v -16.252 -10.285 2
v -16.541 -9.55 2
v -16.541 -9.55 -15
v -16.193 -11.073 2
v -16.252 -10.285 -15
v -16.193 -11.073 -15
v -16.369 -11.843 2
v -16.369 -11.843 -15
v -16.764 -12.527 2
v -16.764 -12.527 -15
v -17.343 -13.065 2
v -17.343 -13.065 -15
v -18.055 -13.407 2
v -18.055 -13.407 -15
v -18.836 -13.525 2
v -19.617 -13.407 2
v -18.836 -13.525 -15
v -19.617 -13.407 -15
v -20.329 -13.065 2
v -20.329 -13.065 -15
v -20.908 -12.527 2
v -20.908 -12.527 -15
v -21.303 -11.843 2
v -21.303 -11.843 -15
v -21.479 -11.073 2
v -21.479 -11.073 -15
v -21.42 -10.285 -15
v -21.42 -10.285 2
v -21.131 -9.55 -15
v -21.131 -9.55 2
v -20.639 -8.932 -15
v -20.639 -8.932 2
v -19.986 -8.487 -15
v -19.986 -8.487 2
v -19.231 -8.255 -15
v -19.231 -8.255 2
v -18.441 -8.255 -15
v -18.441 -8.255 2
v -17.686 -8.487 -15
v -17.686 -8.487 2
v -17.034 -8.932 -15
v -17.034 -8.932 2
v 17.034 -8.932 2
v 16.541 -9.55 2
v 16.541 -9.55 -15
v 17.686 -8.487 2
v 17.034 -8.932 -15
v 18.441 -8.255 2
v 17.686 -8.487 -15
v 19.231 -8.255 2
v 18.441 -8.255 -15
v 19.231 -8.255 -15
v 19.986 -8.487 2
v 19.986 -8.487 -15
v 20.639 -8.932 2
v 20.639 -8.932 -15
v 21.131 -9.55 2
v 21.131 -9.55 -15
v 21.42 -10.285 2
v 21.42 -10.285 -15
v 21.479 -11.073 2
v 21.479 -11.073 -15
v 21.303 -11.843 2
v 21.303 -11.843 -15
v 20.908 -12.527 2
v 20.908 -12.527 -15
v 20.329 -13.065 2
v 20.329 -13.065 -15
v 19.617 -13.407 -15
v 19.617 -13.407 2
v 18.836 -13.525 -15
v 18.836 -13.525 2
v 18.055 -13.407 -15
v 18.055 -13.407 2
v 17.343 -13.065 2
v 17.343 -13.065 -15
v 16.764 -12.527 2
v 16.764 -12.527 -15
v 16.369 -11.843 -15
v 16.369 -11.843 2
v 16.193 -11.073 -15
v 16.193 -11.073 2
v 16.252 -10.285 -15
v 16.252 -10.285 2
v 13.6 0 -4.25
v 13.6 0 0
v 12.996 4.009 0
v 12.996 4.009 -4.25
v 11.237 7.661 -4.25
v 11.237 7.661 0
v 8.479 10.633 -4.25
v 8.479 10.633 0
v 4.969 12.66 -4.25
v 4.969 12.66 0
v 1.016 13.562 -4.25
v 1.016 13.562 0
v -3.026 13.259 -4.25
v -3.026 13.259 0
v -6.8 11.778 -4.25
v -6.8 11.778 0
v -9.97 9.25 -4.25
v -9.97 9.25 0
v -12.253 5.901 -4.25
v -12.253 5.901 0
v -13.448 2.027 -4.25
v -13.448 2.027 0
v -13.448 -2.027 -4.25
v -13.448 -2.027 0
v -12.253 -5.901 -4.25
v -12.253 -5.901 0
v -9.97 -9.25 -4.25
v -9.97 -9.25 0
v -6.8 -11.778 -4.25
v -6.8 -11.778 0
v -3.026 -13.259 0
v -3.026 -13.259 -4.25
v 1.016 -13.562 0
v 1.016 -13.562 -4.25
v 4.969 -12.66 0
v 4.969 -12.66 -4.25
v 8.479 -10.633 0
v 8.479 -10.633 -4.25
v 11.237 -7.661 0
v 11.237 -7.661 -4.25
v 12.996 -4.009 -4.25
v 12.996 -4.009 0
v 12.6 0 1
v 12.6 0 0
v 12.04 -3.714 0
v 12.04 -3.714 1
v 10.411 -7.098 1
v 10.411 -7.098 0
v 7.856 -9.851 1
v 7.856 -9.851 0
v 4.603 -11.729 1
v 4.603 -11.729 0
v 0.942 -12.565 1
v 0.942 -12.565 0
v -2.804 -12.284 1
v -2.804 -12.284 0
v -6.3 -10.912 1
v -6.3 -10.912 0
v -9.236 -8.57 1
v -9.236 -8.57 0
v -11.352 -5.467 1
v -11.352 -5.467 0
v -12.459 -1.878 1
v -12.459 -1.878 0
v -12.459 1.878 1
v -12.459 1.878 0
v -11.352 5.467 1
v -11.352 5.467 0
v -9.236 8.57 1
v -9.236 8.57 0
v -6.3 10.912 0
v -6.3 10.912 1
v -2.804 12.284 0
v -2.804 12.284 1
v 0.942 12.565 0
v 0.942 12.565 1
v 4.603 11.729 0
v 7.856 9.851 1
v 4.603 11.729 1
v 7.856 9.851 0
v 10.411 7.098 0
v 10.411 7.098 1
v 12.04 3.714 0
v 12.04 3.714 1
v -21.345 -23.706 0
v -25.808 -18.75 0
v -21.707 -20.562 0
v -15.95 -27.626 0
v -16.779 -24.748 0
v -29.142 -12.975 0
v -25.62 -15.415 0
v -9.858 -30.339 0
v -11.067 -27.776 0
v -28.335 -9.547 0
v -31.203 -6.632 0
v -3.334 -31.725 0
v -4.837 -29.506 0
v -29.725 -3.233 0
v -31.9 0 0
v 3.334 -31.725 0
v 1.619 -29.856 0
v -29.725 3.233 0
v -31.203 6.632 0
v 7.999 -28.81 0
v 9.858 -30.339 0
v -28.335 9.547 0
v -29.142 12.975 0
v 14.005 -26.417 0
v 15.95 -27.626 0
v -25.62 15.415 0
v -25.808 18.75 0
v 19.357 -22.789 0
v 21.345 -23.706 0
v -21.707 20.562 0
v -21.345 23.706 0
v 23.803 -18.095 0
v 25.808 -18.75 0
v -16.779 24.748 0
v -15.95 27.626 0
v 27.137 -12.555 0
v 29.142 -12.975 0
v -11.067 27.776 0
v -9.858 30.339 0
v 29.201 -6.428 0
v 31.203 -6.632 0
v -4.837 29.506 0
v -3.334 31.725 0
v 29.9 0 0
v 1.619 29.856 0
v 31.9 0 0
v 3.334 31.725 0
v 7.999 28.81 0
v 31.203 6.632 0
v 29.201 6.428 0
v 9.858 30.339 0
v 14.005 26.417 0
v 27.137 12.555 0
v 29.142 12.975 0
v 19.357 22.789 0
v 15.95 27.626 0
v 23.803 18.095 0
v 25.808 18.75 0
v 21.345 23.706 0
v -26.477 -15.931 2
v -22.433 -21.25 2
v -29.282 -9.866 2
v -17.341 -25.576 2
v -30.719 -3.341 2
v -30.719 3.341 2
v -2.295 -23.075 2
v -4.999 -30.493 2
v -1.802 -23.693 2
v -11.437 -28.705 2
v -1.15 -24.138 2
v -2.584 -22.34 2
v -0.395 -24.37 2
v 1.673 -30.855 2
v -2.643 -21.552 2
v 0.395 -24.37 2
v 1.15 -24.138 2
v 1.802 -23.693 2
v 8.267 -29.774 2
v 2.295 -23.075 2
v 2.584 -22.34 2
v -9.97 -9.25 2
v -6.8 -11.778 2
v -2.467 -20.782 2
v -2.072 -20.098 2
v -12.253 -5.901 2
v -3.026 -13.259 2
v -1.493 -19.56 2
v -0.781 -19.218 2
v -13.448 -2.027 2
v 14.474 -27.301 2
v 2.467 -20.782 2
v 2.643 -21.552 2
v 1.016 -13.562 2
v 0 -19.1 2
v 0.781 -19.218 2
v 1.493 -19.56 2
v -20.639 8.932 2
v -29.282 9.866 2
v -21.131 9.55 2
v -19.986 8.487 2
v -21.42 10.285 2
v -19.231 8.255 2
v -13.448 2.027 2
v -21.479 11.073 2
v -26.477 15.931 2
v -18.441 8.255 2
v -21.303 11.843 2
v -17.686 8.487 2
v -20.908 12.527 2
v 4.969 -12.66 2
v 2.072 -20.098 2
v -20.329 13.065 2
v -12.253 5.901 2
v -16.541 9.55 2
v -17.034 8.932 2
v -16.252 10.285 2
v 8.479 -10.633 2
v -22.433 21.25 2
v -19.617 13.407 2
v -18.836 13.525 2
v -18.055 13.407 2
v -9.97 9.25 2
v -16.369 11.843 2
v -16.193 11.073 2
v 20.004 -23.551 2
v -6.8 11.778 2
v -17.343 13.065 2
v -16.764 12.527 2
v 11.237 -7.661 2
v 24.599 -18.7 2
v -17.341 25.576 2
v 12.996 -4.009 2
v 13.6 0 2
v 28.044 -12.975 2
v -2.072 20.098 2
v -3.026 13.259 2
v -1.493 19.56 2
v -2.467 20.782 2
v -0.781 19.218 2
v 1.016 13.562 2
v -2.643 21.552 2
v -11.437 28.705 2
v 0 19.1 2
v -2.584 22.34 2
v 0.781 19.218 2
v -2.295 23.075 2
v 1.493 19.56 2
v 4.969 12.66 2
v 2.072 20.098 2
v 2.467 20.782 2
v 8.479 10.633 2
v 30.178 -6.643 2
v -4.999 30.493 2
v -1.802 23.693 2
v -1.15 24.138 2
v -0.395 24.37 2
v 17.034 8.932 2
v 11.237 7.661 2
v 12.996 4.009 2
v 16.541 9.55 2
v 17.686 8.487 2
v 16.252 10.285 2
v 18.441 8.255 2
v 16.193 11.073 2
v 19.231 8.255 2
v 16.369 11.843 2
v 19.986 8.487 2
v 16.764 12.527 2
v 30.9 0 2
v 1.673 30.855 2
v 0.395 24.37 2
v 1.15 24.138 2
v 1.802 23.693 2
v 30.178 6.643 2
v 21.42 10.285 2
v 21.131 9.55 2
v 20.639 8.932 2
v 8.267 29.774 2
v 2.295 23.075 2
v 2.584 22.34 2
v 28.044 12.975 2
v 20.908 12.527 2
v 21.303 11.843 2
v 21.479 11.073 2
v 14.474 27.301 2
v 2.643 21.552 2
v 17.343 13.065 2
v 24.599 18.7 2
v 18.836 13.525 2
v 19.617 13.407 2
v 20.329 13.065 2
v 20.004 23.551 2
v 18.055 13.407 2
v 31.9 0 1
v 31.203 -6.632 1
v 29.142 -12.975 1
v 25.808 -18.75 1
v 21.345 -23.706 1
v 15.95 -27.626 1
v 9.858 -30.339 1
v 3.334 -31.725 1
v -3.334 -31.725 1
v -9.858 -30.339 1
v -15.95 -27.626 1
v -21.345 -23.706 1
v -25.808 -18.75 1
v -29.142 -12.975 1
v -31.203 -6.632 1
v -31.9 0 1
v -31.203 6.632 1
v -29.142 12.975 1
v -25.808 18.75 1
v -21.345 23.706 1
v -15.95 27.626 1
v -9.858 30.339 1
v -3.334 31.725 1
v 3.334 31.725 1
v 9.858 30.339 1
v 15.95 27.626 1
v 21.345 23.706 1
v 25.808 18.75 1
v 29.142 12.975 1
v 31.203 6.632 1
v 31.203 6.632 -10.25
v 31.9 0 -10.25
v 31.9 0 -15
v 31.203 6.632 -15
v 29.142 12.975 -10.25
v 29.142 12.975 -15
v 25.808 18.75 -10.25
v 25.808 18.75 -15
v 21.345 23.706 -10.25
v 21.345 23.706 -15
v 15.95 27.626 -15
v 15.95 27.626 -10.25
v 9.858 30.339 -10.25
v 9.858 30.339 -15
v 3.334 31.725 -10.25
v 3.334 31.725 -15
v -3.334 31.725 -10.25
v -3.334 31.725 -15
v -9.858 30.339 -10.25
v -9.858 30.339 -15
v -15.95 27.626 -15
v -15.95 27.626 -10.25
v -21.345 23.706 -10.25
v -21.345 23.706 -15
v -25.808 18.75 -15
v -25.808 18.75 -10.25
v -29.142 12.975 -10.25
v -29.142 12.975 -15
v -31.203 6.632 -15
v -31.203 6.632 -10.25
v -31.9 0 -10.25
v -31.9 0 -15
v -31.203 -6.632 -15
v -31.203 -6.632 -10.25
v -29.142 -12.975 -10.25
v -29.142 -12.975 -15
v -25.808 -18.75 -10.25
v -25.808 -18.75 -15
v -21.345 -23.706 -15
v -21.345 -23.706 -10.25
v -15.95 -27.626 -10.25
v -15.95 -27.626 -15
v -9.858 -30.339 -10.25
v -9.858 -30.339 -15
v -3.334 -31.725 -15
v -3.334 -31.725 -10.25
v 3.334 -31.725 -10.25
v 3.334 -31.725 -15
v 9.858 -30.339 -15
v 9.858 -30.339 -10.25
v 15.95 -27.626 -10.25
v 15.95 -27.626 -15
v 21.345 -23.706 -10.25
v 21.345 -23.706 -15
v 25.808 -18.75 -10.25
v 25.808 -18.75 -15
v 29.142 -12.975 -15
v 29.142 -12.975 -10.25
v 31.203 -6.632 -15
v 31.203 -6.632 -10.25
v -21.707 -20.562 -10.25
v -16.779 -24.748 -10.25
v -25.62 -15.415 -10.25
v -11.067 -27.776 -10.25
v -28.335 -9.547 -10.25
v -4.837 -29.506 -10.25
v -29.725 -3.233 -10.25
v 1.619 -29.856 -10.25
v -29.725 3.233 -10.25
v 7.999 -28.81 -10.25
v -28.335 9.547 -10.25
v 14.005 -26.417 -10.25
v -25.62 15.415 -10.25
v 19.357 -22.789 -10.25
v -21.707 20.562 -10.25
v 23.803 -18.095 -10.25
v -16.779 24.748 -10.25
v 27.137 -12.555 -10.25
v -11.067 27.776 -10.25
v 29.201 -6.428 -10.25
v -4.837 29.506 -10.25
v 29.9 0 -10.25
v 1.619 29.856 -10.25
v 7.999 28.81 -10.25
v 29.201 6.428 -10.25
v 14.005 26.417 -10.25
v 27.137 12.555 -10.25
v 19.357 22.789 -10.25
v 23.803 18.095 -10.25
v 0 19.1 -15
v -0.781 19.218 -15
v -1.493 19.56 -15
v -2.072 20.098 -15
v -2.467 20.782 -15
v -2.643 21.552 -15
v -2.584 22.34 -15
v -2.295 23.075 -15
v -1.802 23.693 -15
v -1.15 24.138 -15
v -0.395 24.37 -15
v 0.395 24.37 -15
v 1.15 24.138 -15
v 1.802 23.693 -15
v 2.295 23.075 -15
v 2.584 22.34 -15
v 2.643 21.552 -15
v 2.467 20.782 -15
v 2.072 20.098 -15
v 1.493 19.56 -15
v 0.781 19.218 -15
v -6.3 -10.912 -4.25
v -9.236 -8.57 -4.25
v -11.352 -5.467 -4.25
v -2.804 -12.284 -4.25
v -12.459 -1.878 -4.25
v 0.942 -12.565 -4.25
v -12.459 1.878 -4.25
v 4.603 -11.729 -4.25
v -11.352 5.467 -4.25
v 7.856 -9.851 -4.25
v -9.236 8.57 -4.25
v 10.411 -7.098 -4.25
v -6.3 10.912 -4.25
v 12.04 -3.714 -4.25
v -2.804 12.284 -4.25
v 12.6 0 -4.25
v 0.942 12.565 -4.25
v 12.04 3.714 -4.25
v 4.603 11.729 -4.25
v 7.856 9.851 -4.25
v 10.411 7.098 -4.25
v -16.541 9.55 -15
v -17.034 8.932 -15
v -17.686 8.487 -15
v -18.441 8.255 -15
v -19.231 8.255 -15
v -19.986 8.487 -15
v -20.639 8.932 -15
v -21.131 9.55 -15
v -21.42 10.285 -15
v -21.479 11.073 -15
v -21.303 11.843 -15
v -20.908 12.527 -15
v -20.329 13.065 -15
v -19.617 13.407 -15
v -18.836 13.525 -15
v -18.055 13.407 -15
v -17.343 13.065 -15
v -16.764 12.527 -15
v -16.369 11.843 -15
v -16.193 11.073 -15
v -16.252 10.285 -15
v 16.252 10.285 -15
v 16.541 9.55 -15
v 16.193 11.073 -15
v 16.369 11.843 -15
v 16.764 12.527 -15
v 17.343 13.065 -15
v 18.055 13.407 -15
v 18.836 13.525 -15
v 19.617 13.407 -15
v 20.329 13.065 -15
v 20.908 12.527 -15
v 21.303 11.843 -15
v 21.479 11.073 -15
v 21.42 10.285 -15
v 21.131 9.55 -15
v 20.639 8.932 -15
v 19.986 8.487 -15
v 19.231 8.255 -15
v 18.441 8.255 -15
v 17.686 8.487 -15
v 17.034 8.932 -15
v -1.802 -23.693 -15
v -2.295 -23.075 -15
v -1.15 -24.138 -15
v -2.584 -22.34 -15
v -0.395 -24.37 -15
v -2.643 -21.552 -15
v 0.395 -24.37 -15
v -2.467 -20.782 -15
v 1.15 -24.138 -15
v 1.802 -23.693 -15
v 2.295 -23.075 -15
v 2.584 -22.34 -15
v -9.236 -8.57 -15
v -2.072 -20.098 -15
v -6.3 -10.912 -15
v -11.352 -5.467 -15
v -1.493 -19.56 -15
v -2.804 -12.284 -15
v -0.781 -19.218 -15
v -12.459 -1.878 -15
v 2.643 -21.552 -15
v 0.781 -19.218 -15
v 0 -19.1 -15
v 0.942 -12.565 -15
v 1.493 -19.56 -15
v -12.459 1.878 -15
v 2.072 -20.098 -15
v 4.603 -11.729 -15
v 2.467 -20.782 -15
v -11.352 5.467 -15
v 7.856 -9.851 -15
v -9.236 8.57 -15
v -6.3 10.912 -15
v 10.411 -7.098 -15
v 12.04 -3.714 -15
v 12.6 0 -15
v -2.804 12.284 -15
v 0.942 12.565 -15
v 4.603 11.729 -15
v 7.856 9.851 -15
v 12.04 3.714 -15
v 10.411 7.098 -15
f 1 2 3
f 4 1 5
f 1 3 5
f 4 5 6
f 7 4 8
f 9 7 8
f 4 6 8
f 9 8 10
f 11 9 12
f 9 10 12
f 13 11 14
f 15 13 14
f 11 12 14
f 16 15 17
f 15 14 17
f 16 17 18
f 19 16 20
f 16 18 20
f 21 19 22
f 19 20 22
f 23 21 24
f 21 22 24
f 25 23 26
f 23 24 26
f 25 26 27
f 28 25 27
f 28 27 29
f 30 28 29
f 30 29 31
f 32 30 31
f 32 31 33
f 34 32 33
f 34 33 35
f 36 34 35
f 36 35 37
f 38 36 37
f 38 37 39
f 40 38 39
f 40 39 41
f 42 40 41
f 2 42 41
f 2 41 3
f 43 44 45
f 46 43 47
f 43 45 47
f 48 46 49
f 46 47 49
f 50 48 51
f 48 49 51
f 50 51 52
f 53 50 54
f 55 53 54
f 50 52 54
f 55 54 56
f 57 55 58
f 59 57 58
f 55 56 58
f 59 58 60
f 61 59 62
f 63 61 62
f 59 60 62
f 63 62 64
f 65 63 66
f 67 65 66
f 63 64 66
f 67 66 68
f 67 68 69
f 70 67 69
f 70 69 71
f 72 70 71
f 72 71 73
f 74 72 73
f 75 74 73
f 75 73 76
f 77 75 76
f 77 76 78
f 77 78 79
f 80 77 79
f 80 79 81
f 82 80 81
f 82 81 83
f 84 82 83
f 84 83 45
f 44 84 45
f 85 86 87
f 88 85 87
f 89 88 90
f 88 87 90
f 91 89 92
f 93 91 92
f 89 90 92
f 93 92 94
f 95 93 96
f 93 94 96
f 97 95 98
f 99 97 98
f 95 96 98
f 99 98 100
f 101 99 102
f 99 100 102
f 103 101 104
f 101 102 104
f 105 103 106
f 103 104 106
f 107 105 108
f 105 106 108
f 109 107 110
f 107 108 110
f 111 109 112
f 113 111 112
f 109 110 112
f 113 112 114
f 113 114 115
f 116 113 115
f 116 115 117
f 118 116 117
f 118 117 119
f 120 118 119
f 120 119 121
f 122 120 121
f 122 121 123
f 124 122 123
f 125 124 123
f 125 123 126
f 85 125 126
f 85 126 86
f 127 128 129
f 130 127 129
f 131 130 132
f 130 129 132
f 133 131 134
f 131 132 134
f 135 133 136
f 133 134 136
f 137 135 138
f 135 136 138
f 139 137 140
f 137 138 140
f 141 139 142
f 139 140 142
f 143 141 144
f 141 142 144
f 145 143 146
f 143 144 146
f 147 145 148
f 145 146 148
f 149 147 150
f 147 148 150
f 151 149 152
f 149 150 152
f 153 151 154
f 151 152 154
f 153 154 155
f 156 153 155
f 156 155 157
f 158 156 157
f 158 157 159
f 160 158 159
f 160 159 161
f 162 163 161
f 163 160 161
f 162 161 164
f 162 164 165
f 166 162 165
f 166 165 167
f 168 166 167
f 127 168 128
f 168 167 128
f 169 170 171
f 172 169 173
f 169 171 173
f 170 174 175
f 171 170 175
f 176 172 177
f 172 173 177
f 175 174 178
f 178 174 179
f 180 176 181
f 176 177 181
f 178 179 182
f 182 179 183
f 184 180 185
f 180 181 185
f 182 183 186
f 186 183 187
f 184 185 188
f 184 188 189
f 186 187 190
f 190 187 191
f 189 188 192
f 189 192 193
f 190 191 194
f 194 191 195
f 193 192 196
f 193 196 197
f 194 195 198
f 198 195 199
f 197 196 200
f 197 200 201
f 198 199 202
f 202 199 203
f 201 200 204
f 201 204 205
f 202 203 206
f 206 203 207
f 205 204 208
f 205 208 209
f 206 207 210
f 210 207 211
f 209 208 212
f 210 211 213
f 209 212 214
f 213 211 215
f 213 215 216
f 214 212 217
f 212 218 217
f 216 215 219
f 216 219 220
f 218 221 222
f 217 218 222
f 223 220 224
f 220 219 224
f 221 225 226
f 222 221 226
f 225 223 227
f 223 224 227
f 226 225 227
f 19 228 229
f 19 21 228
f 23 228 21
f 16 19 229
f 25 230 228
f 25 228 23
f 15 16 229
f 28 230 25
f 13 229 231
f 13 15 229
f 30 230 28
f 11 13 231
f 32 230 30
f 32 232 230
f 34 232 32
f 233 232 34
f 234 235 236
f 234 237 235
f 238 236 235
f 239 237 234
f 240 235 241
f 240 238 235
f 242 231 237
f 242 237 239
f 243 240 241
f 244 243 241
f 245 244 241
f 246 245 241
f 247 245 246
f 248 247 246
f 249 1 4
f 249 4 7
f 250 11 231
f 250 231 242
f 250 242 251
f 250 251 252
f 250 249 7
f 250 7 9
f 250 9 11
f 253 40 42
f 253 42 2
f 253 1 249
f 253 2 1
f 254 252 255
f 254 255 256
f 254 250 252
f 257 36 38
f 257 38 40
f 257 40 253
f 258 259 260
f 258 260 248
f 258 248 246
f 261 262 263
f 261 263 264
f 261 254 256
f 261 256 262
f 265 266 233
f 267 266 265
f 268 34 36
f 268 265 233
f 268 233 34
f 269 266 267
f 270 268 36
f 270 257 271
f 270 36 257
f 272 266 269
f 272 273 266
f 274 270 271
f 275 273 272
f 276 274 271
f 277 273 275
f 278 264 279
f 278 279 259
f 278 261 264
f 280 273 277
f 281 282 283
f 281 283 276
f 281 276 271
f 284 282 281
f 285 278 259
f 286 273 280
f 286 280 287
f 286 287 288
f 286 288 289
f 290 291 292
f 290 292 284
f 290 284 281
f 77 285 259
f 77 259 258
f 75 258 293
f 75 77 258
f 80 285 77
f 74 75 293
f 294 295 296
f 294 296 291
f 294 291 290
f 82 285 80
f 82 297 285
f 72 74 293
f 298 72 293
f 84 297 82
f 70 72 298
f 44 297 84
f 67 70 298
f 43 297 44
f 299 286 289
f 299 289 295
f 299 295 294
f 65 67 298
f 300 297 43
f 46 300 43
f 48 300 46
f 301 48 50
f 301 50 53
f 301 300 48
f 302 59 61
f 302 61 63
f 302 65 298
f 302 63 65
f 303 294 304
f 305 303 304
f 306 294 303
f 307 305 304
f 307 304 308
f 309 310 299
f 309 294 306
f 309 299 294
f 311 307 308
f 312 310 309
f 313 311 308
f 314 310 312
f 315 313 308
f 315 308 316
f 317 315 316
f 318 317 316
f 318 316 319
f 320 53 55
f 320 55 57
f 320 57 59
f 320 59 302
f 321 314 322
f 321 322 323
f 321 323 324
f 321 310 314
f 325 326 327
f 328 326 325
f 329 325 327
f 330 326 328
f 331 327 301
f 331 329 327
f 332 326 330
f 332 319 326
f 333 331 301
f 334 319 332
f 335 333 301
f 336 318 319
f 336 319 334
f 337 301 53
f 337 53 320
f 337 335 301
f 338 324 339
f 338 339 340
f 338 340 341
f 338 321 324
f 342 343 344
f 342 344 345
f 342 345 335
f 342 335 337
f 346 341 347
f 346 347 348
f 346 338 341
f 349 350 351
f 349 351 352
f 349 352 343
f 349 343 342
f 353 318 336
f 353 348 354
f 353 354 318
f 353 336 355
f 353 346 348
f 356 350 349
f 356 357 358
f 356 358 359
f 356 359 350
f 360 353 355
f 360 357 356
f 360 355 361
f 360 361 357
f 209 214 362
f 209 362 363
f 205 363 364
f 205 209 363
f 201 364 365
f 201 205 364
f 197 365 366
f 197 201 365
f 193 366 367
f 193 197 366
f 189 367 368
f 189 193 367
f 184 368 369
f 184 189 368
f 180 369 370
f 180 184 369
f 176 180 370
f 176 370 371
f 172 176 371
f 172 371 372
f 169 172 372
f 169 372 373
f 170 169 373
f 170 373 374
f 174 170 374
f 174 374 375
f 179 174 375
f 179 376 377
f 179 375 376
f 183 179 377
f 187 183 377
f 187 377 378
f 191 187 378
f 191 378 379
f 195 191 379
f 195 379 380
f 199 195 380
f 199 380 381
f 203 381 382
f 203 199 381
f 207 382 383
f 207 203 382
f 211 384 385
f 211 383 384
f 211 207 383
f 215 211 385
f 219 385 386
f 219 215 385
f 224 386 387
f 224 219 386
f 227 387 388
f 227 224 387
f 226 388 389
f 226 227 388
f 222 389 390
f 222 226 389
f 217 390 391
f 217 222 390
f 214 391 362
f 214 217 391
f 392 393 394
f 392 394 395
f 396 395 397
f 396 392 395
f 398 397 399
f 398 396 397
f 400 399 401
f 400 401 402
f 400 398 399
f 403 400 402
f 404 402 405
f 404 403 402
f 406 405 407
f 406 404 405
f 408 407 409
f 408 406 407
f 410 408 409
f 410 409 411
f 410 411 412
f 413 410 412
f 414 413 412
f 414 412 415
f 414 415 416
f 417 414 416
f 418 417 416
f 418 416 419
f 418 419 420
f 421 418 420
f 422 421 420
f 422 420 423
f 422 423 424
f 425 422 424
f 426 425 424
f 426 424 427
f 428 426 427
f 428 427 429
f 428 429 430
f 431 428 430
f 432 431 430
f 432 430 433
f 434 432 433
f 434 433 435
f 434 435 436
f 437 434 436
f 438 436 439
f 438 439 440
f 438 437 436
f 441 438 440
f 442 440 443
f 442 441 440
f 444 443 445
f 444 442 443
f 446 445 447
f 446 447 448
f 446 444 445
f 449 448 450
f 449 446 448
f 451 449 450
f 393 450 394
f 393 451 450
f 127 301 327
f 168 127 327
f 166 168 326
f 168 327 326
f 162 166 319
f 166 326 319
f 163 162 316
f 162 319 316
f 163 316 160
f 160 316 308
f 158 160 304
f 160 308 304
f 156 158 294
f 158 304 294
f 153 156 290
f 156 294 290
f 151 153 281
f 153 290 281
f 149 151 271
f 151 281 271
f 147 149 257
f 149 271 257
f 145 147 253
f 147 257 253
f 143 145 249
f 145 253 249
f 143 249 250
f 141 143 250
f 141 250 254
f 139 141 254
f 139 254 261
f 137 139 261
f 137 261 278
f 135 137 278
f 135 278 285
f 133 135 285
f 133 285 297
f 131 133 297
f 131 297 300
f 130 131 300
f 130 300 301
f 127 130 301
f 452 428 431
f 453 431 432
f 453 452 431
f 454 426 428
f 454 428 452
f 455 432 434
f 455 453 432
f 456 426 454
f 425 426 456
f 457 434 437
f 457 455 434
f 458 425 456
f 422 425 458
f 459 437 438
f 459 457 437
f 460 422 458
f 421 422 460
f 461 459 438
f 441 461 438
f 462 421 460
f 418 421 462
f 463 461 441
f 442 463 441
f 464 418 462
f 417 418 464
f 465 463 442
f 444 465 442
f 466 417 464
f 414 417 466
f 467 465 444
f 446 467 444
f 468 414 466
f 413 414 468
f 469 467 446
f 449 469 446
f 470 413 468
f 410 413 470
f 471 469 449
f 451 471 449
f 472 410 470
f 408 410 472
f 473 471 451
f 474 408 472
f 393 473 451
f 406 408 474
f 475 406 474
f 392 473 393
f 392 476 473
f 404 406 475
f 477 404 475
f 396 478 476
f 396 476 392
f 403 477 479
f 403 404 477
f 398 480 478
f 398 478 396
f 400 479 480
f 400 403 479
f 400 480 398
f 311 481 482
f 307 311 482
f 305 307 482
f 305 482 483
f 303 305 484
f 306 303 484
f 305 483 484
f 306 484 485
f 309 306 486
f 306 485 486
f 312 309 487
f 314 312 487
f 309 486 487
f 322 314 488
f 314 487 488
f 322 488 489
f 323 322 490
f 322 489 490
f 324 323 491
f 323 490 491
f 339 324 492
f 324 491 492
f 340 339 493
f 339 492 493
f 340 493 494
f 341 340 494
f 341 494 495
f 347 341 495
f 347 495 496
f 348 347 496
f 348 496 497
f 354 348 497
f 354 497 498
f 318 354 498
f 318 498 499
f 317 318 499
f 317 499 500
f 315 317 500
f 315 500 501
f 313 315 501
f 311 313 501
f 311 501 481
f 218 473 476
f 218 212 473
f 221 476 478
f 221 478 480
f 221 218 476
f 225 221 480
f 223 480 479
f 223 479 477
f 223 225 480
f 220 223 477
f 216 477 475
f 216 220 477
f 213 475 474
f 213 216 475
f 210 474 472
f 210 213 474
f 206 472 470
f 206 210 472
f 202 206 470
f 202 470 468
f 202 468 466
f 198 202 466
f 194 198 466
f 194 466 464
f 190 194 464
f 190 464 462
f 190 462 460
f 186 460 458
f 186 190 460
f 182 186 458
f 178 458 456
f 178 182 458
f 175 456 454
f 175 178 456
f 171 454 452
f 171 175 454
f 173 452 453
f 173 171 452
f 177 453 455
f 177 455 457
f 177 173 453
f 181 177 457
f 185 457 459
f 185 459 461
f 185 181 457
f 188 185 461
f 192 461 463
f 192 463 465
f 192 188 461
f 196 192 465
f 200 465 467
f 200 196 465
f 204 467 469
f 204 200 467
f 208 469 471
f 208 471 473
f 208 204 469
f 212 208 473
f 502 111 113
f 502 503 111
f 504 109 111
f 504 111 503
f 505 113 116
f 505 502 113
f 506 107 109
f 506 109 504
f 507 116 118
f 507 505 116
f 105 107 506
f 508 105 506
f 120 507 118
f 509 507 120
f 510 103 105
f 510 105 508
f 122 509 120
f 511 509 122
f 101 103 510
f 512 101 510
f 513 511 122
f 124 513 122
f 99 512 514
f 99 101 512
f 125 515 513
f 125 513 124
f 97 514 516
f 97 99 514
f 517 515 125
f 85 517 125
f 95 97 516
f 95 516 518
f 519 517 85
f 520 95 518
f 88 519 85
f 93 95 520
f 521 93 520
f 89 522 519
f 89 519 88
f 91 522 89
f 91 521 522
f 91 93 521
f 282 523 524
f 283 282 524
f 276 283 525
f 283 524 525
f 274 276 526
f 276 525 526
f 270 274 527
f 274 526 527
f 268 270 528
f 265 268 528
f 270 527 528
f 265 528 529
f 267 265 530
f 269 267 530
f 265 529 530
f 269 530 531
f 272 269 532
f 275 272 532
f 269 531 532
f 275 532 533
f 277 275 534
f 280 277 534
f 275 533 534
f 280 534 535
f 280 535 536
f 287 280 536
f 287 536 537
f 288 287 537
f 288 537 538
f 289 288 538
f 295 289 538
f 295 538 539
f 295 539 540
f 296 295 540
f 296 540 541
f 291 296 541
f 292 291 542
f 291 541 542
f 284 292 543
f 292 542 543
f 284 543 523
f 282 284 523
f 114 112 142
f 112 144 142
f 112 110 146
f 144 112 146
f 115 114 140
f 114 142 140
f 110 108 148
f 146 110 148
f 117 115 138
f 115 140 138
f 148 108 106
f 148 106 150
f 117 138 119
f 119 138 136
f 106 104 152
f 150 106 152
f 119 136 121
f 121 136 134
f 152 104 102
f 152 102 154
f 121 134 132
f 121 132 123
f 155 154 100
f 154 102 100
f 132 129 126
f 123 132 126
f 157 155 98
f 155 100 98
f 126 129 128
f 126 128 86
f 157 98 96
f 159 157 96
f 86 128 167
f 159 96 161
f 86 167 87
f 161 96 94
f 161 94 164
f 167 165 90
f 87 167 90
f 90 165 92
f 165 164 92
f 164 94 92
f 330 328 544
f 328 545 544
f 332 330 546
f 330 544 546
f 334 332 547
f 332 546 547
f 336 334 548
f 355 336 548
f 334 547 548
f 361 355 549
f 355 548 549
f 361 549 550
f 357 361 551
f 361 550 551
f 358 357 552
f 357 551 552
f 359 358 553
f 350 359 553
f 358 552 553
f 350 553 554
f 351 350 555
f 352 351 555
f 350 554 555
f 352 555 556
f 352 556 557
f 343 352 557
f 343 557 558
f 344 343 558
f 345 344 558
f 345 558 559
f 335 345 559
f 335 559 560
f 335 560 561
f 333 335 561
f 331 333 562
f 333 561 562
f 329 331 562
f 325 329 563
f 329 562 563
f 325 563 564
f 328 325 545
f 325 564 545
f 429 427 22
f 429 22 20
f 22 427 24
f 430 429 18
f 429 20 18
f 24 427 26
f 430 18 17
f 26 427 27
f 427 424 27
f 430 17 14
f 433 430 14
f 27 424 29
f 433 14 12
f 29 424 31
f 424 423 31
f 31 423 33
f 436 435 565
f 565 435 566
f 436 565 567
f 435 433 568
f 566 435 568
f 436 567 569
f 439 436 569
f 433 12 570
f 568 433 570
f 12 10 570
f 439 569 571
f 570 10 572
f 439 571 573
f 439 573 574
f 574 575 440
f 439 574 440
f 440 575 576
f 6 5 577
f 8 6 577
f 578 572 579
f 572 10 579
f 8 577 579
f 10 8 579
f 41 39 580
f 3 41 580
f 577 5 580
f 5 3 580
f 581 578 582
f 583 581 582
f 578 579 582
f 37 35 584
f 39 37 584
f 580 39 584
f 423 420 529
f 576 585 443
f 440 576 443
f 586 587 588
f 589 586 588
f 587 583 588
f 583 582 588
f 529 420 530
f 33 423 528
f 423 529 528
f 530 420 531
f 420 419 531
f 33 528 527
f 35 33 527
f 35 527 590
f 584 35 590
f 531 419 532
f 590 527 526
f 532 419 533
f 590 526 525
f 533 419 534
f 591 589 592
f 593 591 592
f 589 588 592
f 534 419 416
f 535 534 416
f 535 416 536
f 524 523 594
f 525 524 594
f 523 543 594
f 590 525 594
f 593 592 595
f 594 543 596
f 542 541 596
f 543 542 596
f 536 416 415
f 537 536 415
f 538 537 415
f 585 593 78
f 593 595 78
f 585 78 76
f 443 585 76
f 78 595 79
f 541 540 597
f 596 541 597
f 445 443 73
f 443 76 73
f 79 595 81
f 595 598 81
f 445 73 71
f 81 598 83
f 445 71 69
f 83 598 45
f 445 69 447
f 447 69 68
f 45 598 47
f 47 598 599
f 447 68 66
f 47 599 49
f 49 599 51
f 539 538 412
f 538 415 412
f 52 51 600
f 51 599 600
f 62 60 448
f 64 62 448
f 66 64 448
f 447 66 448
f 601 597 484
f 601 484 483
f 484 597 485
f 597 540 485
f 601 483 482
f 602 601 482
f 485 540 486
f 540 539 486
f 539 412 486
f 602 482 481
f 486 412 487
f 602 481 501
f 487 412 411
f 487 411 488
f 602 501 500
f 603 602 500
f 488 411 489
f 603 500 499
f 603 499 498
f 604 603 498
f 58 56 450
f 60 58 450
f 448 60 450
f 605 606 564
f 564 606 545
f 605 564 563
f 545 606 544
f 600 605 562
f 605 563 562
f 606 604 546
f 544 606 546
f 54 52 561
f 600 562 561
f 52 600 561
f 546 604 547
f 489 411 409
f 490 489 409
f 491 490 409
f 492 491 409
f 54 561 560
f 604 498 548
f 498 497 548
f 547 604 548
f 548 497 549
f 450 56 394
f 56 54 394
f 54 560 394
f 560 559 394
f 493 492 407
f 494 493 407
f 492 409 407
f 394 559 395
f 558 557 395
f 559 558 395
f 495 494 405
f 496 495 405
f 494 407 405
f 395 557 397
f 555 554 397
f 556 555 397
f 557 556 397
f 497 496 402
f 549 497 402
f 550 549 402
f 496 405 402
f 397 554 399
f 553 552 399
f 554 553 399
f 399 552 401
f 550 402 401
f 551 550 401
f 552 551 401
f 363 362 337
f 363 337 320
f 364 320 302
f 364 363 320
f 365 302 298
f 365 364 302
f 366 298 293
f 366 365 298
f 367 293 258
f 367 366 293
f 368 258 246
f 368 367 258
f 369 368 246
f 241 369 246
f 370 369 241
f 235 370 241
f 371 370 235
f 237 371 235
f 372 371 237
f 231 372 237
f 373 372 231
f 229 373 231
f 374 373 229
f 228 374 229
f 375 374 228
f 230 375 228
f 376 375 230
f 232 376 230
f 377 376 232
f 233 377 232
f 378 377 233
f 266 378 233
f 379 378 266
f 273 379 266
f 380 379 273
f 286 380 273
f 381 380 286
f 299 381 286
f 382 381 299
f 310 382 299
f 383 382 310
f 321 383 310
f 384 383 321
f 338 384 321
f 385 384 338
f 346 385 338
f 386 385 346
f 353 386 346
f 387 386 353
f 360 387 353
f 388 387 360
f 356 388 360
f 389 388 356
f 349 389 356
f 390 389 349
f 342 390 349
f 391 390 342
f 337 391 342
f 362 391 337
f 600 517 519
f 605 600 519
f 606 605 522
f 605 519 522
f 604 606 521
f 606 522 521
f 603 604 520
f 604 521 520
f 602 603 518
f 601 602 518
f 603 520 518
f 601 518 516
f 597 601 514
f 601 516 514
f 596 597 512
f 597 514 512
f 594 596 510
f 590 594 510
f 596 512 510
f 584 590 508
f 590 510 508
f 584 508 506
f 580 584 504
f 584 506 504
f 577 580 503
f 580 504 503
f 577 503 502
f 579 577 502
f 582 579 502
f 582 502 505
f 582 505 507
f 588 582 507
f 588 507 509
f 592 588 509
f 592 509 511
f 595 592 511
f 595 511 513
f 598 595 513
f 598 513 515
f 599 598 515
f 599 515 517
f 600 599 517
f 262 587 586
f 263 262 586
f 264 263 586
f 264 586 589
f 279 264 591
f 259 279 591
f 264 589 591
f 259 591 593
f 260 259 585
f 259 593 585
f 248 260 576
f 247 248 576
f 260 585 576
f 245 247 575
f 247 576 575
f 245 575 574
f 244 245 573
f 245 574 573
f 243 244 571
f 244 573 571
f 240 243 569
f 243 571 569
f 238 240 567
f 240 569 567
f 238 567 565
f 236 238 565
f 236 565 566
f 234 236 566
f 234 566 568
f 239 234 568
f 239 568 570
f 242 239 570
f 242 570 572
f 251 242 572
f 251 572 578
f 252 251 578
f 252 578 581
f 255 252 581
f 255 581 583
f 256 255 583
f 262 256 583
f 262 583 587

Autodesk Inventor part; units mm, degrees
sketch "Sketch1" plane through (0, 0, 0) normal (0, 0, 1) x (1, 0, 0)
  circle A0 centre (0, 0) radius 29.9
  circle A1 centre (0, 0) radius 13.6
  dimension "d0" = 59.8
  dimension "d1" = 27.2
extrude "Extrusion1" add sketch "Sketch1" against normal blind 15
ref_plane "Work Plane1" through (0, 0, -4.25) normal (0, 0, 1) x (1, 0, 0)
ref_plane "Work Plane2" through (0, 0, -10.25) normal (0, 0, 1) x (1, 0, 0)
sketch "Sketch2" plane through (0, 0, 0) normal (0, 0, 1) x (1, 0, 0)
  circle A0 centre (0, 0) radius 29.9 projected
  circle A1 centre (0, 0) radius 13.6 projected
  circle A2 centre (0, 0) radius 12.6
  circle A3 centre (0, 0) radius 31.9
  dimension "d4" = 1
  dimension "d8" = 2
extrude "Extrusion2" add sketch "Sketch2" against normal up to surface (10.75 mm away) from surface at -4.25 contours A1
extrude "Extrusion3" add sketch "Sketch2" against normal up to surface (4.75 mm away) from surface at -10.25 contours A3
sketch "Sketch8" plane through (0, 0, 0) normal (0, 0, 1) x (1, 0, 0)
  circle A0 centre (0, 0) radius 29.9 projected
  circle A1 centre (0, 0) radius 13.6 projected
  circle A2 centre (0, 0) radius 31.9 projected
  circle A3 centre (0, 0) radius 12.6 projected
extrude "Extrusion8" add sketch "Sketch8" along normal blind 2 contours A0 | A1 | A2
sketch "Sketch9" plane through (0, 0, 2) normal (0, 0, 1) x (1, 0, 0)
  circle A0 centre (0, 0) radius 29.9 projected
  circle A1 centre (0, 0) radius 29.9 projected
  circle A2 centre (0, 0) radius 13.6 projected
  circle A3 centre (0, 0) radius 13.6 projected
  line L0 (0, 29.9) -> (0, 13.6) construction
  point P0 (0, 21.75)
hole "Hole3" at (0, 21.75, 2) direction (0, 0, -1) diameter 5.3 end through all
pattern_circular "Circular Pattern2" count 6 over 360 about axis through (0, 0, 0) along (0, 0, 1) of "Hole3"
chamfer "Chamfer1" distance 1 angle 45 2 edges at (-31.9, 0, 2) (-12.6, 0, 2)
ref_plane "Work Plane5" through (0, 0, -5.125) normal (0, 0, -1) x (-1, 0, 0)
properties part number "Spool Holder BAse" material "ABS Plastic"
